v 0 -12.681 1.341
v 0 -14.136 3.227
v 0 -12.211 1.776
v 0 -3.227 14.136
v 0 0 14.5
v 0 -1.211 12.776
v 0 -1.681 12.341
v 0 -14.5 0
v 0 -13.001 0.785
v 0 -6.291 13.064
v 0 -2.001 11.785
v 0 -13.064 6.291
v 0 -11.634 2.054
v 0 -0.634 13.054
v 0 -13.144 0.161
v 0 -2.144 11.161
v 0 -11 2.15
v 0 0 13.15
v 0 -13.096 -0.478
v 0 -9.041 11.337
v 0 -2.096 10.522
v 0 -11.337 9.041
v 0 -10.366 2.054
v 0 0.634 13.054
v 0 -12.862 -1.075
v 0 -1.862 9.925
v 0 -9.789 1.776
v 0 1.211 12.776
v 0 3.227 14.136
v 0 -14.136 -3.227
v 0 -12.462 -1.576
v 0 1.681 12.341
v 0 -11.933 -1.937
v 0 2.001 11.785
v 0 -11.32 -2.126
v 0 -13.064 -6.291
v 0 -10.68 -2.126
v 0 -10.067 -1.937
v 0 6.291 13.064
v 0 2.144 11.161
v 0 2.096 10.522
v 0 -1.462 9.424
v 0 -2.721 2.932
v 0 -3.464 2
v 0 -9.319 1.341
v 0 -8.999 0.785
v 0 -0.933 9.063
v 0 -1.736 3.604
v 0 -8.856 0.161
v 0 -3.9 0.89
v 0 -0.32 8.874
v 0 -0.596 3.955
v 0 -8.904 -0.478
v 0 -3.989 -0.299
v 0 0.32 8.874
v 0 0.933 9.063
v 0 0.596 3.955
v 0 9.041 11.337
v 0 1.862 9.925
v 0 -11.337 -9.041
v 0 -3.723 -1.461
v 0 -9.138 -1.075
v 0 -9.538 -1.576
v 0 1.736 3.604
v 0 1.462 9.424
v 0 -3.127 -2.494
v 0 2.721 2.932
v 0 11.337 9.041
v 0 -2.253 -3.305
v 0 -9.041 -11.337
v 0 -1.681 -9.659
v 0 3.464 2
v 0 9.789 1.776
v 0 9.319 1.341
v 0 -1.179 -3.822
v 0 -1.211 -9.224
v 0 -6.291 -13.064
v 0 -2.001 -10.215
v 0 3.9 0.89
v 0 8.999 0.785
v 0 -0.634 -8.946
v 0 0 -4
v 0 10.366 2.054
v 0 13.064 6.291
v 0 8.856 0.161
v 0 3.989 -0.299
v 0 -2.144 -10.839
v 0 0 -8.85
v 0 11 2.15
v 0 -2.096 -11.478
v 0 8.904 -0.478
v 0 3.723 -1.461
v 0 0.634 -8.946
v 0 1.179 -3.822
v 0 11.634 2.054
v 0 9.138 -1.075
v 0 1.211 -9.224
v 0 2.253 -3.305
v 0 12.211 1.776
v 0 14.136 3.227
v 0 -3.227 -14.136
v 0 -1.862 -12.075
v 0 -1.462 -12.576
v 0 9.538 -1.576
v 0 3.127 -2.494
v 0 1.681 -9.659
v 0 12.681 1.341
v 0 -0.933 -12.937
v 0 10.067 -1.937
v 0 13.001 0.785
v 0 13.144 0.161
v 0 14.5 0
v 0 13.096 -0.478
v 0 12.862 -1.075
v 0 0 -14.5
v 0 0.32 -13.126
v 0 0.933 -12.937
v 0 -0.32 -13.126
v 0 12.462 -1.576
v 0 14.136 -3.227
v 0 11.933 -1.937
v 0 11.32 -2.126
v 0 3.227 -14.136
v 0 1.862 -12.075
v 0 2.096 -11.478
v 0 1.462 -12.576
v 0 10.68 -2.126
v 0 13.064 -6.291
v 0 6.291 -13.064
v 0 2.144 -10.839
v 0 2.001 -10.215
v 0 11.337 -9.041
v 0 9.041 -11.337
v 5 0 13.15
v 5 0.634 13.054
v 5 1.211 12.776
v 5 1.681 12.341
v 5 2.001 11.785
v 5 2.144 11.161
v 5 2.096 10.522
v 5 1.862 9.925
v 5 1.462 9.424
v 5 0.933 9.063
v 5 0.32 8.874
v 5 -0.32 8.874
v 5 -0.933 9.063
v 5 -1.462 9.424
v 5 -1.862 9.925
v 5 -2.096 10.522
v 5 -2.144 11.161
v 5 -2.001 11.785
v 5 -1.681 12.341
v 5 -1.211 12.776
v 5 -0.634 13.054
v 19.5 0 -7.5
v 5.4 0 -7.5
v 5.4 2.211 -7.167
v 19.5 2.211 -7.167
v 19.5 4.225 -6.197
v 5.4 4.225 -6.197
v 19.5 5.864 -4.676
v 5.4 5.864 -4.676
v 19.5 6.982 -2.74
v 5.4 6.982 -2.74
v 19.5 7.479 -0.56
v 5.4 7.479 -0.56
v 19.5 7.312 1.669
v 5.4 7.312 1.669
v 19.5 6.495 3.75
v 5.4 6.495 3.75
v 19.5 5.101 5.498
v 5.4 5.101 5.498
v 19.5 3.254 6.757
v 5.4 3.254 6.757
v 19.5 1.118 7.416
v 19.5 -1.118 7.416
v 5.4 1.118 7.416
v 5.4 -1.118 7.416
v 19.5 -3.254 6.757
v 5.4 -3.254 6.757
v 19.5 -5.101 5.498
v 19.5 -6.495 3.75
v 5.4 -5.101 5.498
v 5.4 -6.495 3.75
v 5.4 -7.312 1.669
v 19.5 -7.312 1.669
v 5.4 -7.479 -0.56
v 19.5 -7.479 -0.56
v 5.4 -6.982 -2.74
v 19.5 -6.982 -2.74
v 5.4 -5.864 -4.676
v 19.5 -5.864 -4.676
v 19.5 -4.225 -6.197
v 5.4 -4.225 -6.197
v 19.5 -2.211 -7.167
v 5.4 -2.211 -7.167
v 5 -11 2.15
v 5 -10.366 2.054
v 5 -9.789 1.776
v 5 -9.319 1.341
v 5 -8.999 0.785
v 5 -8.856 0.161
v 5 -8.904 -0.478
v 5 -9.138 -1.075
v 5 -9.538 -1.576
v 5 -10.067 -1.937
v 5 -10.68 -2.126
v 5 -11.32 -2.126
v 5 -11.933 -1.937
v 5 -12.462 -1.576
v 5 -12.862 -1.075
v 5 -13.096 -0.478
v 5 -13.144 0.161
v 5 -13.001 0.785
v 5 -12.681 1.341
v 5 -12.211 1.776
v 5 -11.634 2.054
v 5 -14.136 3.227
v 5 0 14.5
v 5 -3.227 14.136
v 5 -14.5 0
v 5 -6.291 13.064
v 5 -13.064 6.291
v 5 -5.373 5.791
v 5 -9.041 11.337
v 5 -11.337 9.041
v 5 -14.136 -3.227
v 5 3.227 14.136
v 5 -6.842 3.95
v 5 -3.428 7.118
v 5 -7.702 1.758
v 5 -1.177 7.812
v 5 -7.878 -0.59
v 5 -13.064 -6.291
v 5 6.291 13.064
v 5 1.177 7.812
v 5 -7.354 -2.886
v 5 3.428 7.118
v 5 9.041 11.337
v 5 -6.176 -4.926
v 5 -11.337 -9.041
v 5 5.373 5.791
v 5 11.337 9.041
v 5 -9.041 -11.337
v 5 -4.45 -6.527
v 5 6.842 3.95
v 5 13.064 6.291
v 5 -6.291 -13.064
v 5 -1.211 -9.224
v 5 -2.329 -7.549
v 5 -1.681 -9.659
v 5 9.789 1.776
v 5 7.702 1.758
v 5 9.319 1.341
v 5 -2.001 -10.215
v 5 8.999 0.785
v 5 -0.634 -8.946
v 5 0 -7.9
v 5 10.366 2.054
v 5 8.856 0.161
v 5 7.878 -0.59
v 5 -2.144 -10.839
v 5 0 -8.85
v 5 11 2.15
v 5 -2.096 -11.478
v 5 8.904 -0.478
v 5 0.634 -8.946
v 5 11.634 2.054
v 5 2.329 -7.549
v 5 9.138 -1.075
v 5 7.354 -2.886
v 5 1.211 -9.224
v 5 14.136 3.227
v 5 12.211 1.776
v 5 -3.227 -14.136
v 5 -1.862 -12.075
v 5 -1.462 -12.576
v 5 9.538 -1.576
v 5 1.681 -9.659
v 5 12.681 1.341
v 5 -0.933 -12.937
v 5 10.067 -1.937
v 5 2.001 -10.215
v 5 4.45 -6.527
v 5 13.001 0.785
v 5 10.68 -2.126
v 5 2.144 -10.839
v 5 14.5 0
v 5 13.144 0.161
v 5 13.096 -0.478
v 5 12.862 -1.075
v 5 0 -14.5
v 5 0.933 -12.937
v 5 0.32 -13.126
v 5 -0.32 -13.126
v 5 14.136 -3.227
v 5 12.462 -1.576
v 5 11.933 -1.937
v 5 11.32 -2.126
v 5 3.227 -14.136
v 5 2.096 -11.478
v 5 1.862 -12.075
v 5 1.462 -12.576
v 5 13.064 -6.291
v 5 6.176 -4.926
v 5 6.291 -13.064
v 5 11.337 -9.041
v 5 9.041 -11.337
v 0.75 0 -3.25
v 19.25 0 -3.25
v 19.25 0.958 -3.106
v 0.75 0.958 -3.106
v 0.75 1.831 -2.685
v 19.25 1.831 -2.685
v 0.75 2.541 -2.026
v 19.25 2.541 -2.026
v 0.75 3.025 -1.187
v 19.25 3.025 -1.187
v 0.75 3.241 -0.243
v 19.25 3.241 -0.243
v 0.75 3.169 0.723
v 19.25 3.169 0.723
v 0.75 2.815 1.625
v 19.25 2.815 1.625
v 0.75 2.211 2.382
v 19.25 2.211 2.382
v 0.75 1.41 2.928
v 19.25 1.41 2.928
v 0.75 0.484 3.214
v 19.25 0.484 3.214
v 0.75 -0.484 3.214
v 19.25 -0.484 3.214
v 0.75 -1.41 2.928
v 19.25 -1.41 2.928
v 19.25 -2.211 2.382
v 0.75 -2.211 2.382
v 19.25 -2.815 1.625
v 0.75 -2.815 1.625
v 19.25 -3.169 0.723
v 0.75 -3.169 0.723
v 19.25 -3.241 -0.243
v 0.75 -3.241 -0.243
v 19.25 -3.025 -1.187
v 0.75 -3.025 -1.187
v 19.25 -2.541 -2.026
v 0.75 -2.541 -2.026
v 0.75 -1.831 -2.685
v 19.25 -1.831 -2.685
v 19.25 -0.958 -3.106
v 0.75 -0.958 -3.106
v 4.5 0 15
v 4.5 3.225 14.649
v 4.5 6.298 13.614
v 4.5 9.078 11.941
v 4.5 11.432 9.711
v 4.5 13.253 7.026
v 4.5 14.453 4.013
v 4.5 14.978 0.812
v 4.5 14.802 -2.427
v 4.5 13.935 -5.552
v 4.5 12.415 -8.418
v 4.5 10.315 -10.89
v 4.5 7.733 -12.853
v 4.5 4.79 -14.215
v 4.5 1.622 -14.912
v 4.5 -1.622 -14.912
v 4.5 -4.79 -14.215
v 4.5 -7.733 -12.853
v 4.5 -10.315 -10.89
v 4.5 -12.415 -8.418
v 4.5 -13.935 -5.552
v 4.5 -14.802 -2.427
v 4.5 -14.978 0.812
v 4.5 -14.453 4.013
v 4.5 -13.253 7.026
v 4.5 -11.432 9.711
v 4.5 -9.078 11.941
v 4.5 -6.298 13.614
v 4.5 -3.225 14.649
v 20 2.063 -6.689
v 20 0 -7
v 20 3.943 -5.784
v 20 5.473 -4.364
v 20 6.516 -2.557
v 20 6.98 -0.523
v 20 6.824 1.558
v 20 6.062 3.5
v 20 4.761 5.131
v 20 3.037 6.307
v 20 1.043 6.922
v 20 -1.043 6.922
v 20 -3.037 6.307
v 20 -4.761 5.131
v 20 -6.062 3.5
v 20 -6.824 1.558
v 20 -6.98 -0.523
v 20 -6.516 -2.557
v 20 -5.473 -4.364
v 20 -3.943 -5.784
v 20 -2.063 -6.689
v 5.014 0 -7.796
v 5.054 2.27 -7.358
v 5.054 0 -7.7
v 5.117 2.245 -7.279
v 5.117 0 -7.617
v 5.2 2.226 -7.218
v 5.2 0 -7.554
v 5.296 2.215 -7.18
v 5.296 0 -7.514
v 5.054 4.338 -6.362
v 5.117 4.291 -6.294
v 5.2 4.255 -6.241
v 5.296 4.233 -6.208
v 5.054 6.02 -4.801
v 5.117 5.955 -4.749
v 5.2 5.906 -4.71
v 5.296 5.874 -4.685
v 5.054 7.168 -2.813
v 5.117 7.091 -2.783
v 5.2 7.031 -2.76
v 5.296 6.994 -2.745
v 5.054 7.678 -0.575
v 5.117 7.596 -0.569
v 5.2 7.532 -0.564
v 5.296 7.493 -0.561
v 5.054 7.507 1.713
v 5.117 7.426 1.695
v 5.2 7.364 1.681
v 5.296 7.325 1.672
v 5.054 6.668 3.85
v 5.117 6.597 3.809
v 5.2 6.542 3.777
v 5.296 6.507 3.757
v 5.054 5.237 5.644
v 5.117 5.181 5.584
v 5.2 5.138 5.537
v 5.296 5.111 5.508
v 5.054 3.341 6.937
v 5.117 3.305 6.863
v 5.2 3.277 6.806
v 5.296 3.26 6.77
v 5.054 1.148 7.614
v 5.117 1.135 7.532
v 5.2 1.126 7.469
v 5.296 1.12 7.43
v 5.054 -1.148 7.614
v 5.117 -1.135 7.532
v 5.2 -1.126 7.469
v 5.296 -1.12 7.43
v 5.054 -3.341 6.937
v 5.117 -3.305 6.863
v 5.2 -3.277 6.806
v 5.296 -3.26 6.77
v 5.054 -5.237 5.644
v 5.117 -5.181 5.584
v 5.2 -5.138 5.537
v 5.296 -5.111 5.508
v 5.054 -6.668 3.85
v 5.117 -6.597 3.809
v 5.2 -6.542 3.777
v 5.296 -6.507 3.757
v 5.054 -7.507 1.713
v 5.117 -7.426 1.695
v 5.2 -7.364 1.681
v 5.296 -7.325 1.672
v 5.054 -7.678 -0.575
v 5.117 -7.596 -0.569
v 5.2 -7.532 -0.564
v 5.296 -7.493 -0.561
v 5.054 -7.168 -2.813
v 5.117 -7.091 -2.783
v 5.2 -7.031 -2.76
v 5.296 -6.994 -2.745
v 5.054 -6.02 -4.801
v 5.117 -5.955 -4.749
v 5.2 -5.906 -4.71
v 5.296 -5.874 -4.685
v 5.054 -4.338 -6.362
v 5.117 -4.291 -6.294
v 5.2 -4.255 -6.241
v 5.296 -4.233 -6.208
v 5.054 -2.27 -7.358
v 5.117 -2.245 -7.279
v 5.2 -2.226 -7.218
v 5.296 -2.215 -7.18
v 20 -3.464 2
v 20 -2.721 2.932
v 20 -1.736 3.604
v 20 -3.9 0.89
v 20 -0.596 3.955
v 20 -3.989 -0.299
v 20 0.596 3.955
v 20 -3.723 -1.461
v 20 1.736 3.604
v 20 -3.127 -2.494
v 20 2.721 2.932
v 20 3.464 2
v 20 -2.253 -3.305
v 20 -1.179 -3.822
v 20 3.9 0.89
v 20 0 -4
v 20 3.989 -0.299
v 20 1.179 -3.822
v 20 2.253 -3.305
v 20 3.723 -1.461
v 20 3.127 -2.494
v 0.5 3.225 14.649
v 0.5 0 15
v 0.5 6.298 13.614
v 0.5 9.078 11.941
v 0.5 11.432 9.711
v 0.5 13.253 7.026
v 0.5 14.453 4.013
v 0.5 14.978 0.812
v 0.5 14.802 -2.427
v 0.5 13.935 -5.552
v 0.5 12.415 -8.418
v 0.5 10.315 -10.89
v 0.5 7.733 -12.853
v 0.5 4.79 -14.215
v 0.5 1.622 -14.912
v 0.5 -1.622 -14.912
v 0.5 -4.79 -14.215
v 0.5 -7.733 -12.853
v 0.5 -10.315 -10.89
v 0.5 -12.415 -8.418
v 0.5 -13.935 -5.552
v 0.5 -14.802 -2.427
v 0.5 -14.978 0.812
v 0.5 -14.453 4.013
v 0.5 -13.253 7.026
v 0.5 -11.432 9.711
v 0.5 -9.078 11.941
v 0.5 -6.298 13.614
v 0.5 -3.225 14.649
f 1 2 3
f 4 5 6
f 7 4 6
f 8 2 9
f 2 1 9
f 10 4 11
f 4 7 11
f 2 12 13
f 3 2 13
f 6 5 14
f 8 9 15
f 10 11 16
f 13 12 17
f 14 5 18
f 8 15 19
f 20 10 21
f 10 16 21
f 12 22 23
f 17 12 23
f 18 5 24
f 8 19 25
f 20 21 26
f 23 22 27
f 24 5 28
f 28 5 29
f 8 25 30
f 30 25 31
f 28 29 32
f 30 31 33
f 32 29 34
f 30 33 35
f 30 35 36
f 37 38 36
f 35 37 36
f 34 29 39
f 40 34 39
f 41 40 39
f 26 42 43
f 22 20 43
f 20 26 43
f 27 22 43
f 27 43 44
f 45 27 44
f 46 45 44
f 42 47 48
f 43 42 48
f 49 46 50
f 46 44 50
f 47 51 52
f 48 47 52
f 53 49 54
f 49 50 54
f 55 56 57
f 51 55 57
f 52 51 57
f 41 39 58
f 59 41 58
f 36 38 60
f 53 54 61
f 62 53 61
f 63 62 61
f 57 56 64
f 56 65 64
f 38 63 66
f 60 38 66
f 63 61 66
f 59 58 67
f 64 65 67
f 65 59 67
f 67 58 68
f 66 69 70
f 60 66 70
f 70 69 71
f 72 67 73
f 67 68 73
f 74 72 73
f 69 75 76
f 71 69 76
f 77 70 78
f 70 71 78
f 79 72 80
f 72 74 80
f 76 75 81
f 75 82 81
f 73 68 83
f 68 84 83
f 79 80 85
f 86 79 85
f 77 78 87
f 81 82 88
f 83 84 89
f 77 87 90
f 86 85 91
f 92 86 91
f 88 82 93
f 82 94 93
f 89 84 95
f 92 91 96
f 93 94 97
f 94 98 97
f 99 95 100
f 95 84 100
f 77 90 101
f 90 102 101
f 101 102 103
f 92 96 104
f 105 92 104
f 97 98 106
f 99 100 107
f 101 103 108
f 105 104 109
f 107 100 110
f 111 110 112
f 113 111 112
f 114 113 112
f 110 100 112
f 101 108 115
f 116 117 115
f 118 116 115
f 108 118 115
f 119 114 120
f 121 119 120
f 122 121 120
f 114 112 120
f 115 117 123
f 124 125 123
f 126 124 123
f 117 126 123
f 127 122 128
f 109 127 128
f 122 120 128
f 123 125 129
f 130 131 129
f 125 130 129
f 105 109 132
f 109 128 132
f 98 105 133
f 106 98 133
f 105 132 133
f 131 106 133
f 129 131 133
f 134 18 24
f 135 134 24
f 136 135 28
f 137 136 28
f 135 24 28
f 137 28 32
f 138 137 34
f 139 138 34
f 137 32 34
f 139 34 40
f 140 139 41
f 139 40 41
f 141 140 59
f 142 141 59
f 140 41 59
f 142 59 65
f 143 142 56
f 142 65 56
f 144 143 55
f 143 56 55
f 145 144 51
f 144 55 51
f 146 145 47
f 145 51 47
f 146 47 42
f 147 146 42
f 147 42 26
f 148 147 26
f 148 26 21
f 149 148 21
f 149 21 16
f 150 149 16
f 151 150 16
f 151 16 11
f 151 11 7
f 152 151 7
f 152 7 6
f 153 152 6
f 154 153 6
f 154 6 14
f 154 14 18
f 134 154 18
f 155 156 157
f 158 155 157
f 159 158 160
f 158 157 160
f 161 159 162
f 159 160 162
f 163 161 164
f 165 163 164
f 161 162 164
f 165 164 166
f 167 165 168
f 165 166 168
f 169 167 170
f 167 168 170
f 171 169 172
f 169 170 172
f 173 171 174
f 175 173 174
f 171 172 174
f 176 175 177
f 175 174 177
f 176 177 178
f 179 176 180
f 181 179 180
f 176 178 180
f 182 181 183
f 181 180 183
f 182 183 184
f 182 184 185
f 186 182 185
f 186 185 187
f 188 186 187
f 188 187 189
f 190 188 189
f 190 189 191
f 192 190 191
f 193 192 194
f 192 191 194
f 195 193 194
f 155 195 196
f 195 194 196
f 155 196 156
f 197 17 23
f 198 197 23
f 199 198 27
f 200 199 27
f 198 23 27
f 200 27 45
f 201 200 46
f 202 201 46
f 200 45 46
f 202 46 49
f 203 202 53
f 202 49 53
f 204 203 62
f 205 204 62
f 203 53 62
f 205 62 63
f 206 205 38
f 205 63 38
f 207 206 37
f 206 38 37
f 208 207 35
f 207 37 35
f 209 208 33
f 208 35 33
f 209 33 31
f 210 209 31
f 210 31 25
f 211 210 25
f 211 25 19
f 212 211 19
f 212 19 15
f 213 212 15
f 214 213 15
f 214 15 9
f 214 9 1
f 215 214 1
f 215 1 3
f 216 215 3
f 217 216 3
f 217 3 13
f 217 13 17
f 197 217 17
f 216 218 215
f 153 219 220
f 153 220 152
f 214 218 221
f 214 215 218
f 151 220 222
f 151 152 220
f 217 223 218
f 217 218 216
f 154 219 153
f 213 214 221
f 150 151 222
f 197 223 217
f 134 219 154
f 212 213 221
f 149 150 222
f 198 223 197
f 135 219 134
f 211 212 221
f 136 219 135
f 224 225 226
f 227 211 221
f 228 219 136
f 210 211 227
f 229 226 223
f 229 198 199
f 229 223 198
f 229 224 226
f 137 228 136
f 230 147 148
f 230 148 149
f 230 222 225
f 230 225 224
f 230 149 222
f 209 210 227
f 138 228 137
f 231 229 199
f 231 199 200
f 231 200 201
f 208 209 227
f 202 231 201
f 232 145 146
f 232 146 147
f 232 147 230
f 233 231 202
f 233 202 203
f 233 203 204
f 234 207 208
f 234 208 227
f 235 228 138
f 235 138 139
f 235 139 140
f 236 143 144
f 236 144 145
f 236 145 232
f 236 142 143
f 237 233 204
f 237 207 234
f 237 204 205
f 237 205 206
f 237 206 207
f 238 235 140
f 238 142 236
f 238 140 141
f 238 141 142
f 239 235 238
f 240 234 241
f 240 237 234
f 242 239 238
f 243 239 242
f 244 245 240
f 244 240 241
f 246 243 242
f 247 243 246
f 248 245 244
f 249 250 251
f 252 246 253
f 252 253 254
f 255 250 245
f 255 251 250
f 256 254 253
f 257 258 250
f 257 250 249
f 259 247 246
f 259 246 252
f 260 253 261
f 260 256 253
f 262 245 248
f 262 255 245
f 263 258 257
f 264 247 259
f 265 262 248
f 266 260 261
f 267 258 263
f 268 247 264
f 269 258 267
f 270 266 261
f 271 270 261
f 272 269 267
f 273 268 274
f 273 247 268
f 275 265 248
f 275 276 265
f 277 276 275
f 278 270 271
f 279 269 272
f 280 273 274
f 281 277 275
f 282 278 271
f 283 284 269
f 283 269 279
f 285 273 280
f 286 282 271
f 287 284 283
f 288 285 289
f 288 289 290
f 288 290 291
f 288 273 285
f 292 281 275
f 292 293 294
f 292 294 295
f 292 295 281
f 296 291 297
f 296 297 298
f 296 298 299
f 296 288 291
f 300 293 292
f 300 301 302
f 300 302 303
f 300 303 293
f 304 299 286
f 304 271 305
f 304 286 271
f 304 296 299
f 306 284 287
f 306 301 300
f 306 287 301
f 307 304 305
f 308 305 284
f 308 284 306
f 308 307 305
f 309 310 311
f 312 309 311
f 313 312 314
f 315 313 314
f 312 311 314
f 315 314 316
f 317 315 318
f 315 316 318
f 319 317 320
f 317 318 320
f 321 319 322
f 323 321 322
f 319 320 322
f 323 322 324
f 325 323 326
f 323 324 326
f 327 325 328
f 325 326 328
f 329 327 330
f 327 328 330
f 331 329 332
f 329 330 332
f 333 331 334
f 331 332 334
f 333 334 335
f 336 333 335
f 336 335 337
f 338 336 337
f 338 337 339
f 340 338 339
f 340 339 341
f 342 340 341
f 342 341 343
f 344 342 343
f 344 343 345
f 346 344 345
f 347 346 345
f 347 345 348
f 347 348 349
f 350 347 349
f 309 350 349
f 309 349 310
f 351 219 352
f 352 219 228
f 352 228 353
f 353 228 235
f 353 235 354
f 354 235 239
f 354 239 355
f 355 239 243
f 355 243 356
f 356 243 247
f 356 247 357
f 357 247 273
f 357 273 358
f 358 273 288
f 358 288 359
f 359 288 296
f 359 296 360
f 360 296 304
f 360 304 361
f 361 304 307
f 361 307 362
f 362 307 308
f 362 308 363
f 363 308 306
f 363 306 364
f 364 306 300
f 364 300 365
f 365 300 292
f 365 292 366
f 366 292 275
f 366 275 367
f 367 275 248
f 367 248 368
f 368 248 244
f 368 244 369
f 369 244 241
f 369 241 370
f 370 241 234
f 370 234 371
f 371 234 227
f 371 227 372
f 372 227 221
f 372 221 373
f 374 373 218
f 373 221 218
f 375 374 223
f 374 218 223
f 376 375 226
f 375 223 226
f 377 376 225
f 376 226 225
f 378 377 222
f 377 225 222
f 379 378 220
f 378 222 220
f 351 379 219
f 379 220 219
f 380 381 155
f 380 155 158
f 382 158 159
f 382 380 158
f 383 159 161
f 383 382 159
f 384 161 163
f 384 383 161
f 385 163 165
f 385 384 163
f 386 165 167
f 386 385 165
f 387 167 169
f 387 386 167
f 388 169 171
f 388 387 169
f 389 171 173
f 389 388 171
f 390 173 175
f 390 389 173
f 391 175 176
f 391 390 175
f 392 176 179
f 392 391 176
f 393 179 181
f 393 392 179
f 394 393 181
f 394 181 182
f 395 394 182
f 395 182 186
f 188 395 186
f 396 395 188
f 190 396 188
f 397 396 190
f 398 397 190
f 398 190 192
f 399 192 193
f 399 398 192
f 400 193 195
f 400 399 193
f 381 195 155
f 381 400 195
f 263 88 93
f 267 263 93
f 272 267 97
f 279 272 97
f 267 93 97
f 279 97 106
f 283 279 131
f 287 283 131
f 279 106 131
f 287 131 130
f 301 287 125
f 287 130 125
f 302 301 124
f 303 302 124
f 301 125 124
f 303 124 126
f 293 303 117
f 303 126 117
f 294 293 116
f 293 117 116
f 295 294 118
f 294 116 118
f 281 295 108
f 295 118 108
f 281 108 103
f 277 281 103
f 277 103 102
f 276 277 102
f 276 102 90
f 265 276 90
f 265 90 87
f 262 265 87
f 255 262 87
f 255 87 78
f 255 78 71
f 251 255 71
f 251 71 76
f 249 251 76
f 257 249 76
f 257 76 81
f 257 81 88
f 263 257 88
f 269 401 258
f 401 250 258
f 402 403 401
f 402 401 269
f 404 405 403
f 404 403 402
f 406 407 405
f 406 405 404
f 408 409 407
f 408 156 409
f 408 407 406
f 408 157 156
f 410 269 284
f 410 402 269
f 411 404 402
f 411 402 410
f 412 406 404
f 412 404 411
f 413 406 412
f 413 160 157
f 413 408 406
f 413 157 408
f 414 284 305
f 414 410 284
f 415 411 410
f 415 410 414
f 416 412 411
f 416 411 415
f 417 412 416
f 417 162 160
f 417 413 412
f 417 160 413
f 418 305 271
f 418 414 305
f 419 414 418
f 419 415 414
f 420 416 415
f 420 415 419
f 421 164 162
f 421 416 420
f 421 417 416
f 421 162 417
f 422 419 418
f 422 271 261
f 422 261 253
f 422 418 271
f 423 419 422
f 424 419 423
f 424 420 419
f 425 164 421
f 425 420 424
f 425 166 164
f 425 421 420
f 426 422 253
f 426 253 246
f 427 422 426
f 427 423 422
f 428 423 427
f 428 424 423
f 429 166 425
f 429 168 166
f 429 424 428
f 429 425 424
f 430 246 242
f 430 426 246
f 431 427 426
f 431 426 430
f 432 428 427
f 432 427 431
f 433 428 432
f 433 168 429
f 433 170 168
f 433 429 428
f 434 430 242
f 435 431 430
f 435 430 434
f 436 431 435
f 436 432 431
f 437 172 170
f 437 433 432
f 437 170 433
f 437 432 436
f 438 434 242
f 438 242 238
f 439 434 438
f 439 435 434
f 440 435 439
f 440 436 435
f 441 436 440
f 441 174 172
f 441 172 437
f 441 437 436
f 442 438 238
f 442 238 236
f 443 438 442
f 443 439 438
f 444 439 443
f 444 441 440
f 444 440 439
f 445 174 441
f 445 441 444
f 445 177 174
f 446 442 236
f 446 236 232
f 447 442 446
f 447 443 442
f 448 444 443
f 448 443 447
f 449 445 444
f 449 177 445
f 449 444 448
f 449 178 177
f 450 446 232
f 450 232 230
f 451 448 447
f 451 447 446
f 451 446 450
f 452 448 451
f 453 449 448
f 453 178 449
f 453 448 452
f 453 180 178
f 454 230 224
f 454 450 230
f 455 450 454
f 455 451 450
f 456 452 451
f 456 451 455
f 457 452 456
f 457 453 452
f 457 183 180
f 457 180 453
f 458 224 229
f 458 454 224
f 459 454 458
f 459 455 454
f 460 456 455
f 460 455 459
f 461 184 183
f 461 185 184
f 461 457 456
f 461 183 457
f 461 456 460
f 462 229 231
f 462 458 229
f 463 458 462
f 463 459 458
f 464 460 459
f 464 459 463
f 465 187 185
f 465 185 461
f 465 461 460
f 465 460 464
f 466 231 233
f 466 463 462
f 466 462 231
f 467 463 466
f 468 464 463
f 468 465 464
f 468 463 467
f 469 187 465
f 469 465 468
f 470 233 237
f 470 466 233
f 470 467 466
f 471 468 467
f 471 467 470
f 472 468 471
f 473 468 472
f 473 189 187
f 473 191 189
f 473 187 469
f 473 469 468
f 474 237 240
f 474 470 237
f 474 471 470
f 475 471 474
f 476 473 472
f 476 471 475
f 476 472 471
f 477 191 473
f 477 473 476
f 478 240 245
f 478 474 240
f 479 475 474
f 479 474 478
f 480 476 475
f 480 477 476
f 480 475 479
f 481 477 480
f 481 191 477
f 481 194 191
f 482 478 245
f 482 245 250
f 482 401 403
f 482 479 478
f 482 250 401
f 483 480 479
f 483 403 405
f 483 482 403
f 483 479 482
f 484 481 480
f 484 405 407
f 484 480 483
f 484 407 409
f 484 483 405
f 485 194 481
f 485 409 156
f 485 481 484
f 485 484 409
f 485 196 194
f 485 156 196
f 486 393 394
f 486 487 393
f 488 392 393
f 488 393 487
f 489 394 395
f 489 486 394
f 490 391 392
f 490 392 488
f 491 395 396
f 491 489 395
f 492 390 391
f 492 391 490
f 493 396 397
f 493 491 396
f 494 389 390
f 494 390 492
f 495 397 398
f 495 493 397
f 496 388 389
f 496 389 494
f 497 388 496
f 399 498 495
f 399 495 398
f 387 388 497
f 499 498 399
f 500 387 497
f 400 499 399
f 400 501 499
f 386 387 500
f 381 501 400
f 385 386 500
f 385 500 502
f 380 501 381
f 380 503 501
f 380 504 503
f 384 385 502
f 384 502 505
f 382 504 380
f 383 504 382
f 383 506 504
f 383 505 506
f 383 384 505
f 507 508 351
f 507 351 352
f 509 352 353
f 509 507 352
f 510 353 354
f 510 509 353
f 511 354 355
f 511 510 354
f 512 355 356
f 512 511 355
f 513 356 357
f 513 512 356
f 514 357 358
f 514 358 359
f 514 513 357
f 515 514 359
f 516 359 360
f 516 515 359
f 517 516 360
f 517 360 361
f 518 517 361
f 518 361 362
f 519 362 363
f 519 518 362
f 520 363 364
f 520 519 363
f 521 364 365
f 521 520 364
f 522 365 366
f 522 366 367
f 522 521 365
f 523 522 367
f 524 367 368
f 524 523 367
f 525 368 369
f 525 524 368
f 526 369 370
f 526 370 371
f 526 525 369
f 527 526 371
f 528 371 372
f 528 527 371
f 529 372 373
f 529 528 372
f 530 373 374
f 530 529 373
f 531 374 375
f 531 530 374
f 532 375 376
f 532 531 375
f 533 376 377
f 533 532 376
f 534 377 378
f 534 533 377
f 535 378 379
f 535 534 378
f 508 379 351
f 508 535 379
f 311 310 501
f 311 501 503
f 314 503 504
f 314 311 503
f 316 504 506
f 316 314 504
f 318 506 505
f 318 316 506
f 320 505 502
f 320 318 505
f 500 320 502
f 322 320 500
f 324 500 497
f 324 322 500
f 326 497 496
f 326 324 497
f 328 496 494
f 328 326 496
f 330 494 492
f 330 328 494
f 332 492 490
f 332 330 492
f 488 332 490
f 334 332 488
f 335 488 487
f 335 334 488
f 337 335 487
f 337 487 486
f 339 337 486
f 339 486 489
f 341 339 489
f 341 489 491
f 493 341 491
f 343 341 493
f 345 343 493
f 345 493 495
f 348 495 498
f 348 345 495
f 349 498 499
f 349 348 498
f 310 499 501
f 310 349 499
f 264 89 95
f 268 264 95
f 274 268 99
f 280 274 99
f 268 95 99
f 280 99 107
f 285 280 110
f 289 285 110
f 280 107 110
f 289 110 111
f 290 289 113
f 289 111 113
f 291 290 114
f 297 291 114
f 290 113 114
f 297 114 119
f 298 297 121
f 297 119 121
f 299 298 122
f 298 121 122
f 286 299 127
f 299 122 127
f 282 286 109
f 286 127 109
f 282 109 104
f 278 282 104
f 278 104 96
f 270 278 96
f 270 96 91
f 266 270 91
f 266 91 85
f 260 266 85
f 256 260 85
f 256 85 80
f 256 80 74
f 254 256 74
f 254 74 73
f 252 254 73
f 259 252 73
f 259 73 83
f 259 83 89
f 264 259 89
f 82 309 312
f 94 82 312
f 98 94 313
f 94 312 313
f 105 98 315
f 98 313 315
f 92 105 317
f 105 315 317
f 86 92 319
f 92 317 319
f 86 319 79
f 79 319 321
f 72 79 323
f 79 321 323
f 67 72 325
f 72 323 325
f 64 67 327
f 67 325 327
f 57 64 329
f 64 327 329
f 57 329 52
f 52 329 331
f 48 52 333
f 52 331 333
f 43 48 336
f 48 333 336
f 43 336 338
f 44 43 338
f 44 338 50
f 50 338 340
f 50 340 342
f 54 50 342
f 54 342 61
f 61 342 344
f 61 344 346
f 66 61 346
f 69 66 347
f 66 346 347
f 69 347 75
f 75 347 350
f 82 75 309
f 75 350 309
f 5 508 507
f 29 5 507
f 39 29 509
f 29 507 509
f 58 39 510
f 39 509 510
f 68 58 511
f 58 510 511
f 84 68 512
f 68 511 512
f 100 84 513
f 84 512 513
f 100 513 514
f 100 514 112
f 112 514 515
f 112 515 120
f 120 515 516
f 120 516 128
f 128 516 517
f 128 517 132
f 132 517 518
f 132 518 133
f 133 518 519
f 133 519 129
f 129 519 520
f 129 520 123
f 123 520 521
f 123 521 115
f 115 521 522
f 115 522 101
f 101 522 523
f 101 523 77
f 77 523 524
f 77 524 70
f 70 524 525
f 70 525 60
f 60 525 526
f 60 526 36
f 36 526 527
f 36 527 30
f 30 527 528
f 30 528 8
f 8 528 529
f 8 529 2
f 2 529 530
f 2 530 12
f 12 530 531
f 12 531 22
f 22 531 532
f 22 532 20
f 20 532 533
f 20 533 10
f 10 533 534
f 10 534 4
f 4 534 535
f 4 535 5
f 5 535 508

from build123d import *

# Parameters (mm, degrees)
SKETCH1_W                  = 5
SKETCH1_H                  = 15
SKETCH2_R                  = 7.5
BOSS_EXTRUDE1_DEPTH        = 15
F_4_3_4_3_DIAMETER_HOLE1_D = 4.3
F_6_5_6_5_DIAMETER_HOLE1_D = 6.5
CHAMFER1_SIZE              = 0.75
CHAMFER2_SIZE              = 0.5
FILLET1_R                  = 0.4


with BuildPart() as part:
    # Sketch1 → Revolve1 (revolve)
    with BuildSketch(Plane(origin=(0, 0, 0), x_dir=(-1, 0, 0), z_dir=(0, 0, -1)), mode=Mode.PRIVATE) as revolve1_sk:
        with Locations((-2.5, 7.5)):
            Rectangle(SKETCH1_W, SKETCH1_H)
    revolve(revolve1_sk.sketch.rotate(Axis((5, 0, 0), (-1, 0, 0)), 270), axis=Axis((5, 0, 0), (-1, 0, 0)))

    # Sketch2 → Boss-Extrude1 (add)
    with BuildSketch(Plane(origin=(5, 0, 0), x_dir=(0, 0, -1), z_dir=(1, 0, 0))):
        Circle(SKETCH2_R)
    extrude(amount=BOSS_EXTRUDE1_DEPTH)

    # Ø4.3 (4.3) Diameter Hole1 (through all)
    with Locations(Plane(origin=(5, 0, 0), x_dir=(0, 0, -1), z_dir=(1, 0, 0))):
        with Locations((-11, 0), (11, 0), (0, -11), (0, 11)):
            Hole(F_4_3_4_3_DIAMETER_HOLE1_D / 2)

    # Ø6.5 (6.5) Diameter Hole1 (through all)
    with Locations(Plane.ZY):
        with Locations((0, 0)):
            Hole(F_6_5_6_5_DIAMETER_HOLE1_D / 2)

    # Chamfer1
    chamfer1_edges = [part.edges().sort_by_distance(p)[0] for p in [
        (0, 0, 3.25),
        (20, 0, 3.25),
    ]]
    chamfer(chamfer1_edges, length=CHAMFER1_SIZE)

    # Chamfer2
    chamfer2_edges = [part.edges().sort_by_distance(p)[0] for p in [
        (0, 0, -15),
        (5, 0, -15),
        (20, 0, 7.5),
    ]]
    chamfer(chamfer2_edges, length=CHAMFER2_SIZE)

    # Fillet1
    fillet1_edges = [part.edges().sort_by_distance(p)[0] for p in [
        (5, 0, 7.5),
    ]]
    fillet(fillet1_edges, radius=FILLET1_R)


solid = part.part
